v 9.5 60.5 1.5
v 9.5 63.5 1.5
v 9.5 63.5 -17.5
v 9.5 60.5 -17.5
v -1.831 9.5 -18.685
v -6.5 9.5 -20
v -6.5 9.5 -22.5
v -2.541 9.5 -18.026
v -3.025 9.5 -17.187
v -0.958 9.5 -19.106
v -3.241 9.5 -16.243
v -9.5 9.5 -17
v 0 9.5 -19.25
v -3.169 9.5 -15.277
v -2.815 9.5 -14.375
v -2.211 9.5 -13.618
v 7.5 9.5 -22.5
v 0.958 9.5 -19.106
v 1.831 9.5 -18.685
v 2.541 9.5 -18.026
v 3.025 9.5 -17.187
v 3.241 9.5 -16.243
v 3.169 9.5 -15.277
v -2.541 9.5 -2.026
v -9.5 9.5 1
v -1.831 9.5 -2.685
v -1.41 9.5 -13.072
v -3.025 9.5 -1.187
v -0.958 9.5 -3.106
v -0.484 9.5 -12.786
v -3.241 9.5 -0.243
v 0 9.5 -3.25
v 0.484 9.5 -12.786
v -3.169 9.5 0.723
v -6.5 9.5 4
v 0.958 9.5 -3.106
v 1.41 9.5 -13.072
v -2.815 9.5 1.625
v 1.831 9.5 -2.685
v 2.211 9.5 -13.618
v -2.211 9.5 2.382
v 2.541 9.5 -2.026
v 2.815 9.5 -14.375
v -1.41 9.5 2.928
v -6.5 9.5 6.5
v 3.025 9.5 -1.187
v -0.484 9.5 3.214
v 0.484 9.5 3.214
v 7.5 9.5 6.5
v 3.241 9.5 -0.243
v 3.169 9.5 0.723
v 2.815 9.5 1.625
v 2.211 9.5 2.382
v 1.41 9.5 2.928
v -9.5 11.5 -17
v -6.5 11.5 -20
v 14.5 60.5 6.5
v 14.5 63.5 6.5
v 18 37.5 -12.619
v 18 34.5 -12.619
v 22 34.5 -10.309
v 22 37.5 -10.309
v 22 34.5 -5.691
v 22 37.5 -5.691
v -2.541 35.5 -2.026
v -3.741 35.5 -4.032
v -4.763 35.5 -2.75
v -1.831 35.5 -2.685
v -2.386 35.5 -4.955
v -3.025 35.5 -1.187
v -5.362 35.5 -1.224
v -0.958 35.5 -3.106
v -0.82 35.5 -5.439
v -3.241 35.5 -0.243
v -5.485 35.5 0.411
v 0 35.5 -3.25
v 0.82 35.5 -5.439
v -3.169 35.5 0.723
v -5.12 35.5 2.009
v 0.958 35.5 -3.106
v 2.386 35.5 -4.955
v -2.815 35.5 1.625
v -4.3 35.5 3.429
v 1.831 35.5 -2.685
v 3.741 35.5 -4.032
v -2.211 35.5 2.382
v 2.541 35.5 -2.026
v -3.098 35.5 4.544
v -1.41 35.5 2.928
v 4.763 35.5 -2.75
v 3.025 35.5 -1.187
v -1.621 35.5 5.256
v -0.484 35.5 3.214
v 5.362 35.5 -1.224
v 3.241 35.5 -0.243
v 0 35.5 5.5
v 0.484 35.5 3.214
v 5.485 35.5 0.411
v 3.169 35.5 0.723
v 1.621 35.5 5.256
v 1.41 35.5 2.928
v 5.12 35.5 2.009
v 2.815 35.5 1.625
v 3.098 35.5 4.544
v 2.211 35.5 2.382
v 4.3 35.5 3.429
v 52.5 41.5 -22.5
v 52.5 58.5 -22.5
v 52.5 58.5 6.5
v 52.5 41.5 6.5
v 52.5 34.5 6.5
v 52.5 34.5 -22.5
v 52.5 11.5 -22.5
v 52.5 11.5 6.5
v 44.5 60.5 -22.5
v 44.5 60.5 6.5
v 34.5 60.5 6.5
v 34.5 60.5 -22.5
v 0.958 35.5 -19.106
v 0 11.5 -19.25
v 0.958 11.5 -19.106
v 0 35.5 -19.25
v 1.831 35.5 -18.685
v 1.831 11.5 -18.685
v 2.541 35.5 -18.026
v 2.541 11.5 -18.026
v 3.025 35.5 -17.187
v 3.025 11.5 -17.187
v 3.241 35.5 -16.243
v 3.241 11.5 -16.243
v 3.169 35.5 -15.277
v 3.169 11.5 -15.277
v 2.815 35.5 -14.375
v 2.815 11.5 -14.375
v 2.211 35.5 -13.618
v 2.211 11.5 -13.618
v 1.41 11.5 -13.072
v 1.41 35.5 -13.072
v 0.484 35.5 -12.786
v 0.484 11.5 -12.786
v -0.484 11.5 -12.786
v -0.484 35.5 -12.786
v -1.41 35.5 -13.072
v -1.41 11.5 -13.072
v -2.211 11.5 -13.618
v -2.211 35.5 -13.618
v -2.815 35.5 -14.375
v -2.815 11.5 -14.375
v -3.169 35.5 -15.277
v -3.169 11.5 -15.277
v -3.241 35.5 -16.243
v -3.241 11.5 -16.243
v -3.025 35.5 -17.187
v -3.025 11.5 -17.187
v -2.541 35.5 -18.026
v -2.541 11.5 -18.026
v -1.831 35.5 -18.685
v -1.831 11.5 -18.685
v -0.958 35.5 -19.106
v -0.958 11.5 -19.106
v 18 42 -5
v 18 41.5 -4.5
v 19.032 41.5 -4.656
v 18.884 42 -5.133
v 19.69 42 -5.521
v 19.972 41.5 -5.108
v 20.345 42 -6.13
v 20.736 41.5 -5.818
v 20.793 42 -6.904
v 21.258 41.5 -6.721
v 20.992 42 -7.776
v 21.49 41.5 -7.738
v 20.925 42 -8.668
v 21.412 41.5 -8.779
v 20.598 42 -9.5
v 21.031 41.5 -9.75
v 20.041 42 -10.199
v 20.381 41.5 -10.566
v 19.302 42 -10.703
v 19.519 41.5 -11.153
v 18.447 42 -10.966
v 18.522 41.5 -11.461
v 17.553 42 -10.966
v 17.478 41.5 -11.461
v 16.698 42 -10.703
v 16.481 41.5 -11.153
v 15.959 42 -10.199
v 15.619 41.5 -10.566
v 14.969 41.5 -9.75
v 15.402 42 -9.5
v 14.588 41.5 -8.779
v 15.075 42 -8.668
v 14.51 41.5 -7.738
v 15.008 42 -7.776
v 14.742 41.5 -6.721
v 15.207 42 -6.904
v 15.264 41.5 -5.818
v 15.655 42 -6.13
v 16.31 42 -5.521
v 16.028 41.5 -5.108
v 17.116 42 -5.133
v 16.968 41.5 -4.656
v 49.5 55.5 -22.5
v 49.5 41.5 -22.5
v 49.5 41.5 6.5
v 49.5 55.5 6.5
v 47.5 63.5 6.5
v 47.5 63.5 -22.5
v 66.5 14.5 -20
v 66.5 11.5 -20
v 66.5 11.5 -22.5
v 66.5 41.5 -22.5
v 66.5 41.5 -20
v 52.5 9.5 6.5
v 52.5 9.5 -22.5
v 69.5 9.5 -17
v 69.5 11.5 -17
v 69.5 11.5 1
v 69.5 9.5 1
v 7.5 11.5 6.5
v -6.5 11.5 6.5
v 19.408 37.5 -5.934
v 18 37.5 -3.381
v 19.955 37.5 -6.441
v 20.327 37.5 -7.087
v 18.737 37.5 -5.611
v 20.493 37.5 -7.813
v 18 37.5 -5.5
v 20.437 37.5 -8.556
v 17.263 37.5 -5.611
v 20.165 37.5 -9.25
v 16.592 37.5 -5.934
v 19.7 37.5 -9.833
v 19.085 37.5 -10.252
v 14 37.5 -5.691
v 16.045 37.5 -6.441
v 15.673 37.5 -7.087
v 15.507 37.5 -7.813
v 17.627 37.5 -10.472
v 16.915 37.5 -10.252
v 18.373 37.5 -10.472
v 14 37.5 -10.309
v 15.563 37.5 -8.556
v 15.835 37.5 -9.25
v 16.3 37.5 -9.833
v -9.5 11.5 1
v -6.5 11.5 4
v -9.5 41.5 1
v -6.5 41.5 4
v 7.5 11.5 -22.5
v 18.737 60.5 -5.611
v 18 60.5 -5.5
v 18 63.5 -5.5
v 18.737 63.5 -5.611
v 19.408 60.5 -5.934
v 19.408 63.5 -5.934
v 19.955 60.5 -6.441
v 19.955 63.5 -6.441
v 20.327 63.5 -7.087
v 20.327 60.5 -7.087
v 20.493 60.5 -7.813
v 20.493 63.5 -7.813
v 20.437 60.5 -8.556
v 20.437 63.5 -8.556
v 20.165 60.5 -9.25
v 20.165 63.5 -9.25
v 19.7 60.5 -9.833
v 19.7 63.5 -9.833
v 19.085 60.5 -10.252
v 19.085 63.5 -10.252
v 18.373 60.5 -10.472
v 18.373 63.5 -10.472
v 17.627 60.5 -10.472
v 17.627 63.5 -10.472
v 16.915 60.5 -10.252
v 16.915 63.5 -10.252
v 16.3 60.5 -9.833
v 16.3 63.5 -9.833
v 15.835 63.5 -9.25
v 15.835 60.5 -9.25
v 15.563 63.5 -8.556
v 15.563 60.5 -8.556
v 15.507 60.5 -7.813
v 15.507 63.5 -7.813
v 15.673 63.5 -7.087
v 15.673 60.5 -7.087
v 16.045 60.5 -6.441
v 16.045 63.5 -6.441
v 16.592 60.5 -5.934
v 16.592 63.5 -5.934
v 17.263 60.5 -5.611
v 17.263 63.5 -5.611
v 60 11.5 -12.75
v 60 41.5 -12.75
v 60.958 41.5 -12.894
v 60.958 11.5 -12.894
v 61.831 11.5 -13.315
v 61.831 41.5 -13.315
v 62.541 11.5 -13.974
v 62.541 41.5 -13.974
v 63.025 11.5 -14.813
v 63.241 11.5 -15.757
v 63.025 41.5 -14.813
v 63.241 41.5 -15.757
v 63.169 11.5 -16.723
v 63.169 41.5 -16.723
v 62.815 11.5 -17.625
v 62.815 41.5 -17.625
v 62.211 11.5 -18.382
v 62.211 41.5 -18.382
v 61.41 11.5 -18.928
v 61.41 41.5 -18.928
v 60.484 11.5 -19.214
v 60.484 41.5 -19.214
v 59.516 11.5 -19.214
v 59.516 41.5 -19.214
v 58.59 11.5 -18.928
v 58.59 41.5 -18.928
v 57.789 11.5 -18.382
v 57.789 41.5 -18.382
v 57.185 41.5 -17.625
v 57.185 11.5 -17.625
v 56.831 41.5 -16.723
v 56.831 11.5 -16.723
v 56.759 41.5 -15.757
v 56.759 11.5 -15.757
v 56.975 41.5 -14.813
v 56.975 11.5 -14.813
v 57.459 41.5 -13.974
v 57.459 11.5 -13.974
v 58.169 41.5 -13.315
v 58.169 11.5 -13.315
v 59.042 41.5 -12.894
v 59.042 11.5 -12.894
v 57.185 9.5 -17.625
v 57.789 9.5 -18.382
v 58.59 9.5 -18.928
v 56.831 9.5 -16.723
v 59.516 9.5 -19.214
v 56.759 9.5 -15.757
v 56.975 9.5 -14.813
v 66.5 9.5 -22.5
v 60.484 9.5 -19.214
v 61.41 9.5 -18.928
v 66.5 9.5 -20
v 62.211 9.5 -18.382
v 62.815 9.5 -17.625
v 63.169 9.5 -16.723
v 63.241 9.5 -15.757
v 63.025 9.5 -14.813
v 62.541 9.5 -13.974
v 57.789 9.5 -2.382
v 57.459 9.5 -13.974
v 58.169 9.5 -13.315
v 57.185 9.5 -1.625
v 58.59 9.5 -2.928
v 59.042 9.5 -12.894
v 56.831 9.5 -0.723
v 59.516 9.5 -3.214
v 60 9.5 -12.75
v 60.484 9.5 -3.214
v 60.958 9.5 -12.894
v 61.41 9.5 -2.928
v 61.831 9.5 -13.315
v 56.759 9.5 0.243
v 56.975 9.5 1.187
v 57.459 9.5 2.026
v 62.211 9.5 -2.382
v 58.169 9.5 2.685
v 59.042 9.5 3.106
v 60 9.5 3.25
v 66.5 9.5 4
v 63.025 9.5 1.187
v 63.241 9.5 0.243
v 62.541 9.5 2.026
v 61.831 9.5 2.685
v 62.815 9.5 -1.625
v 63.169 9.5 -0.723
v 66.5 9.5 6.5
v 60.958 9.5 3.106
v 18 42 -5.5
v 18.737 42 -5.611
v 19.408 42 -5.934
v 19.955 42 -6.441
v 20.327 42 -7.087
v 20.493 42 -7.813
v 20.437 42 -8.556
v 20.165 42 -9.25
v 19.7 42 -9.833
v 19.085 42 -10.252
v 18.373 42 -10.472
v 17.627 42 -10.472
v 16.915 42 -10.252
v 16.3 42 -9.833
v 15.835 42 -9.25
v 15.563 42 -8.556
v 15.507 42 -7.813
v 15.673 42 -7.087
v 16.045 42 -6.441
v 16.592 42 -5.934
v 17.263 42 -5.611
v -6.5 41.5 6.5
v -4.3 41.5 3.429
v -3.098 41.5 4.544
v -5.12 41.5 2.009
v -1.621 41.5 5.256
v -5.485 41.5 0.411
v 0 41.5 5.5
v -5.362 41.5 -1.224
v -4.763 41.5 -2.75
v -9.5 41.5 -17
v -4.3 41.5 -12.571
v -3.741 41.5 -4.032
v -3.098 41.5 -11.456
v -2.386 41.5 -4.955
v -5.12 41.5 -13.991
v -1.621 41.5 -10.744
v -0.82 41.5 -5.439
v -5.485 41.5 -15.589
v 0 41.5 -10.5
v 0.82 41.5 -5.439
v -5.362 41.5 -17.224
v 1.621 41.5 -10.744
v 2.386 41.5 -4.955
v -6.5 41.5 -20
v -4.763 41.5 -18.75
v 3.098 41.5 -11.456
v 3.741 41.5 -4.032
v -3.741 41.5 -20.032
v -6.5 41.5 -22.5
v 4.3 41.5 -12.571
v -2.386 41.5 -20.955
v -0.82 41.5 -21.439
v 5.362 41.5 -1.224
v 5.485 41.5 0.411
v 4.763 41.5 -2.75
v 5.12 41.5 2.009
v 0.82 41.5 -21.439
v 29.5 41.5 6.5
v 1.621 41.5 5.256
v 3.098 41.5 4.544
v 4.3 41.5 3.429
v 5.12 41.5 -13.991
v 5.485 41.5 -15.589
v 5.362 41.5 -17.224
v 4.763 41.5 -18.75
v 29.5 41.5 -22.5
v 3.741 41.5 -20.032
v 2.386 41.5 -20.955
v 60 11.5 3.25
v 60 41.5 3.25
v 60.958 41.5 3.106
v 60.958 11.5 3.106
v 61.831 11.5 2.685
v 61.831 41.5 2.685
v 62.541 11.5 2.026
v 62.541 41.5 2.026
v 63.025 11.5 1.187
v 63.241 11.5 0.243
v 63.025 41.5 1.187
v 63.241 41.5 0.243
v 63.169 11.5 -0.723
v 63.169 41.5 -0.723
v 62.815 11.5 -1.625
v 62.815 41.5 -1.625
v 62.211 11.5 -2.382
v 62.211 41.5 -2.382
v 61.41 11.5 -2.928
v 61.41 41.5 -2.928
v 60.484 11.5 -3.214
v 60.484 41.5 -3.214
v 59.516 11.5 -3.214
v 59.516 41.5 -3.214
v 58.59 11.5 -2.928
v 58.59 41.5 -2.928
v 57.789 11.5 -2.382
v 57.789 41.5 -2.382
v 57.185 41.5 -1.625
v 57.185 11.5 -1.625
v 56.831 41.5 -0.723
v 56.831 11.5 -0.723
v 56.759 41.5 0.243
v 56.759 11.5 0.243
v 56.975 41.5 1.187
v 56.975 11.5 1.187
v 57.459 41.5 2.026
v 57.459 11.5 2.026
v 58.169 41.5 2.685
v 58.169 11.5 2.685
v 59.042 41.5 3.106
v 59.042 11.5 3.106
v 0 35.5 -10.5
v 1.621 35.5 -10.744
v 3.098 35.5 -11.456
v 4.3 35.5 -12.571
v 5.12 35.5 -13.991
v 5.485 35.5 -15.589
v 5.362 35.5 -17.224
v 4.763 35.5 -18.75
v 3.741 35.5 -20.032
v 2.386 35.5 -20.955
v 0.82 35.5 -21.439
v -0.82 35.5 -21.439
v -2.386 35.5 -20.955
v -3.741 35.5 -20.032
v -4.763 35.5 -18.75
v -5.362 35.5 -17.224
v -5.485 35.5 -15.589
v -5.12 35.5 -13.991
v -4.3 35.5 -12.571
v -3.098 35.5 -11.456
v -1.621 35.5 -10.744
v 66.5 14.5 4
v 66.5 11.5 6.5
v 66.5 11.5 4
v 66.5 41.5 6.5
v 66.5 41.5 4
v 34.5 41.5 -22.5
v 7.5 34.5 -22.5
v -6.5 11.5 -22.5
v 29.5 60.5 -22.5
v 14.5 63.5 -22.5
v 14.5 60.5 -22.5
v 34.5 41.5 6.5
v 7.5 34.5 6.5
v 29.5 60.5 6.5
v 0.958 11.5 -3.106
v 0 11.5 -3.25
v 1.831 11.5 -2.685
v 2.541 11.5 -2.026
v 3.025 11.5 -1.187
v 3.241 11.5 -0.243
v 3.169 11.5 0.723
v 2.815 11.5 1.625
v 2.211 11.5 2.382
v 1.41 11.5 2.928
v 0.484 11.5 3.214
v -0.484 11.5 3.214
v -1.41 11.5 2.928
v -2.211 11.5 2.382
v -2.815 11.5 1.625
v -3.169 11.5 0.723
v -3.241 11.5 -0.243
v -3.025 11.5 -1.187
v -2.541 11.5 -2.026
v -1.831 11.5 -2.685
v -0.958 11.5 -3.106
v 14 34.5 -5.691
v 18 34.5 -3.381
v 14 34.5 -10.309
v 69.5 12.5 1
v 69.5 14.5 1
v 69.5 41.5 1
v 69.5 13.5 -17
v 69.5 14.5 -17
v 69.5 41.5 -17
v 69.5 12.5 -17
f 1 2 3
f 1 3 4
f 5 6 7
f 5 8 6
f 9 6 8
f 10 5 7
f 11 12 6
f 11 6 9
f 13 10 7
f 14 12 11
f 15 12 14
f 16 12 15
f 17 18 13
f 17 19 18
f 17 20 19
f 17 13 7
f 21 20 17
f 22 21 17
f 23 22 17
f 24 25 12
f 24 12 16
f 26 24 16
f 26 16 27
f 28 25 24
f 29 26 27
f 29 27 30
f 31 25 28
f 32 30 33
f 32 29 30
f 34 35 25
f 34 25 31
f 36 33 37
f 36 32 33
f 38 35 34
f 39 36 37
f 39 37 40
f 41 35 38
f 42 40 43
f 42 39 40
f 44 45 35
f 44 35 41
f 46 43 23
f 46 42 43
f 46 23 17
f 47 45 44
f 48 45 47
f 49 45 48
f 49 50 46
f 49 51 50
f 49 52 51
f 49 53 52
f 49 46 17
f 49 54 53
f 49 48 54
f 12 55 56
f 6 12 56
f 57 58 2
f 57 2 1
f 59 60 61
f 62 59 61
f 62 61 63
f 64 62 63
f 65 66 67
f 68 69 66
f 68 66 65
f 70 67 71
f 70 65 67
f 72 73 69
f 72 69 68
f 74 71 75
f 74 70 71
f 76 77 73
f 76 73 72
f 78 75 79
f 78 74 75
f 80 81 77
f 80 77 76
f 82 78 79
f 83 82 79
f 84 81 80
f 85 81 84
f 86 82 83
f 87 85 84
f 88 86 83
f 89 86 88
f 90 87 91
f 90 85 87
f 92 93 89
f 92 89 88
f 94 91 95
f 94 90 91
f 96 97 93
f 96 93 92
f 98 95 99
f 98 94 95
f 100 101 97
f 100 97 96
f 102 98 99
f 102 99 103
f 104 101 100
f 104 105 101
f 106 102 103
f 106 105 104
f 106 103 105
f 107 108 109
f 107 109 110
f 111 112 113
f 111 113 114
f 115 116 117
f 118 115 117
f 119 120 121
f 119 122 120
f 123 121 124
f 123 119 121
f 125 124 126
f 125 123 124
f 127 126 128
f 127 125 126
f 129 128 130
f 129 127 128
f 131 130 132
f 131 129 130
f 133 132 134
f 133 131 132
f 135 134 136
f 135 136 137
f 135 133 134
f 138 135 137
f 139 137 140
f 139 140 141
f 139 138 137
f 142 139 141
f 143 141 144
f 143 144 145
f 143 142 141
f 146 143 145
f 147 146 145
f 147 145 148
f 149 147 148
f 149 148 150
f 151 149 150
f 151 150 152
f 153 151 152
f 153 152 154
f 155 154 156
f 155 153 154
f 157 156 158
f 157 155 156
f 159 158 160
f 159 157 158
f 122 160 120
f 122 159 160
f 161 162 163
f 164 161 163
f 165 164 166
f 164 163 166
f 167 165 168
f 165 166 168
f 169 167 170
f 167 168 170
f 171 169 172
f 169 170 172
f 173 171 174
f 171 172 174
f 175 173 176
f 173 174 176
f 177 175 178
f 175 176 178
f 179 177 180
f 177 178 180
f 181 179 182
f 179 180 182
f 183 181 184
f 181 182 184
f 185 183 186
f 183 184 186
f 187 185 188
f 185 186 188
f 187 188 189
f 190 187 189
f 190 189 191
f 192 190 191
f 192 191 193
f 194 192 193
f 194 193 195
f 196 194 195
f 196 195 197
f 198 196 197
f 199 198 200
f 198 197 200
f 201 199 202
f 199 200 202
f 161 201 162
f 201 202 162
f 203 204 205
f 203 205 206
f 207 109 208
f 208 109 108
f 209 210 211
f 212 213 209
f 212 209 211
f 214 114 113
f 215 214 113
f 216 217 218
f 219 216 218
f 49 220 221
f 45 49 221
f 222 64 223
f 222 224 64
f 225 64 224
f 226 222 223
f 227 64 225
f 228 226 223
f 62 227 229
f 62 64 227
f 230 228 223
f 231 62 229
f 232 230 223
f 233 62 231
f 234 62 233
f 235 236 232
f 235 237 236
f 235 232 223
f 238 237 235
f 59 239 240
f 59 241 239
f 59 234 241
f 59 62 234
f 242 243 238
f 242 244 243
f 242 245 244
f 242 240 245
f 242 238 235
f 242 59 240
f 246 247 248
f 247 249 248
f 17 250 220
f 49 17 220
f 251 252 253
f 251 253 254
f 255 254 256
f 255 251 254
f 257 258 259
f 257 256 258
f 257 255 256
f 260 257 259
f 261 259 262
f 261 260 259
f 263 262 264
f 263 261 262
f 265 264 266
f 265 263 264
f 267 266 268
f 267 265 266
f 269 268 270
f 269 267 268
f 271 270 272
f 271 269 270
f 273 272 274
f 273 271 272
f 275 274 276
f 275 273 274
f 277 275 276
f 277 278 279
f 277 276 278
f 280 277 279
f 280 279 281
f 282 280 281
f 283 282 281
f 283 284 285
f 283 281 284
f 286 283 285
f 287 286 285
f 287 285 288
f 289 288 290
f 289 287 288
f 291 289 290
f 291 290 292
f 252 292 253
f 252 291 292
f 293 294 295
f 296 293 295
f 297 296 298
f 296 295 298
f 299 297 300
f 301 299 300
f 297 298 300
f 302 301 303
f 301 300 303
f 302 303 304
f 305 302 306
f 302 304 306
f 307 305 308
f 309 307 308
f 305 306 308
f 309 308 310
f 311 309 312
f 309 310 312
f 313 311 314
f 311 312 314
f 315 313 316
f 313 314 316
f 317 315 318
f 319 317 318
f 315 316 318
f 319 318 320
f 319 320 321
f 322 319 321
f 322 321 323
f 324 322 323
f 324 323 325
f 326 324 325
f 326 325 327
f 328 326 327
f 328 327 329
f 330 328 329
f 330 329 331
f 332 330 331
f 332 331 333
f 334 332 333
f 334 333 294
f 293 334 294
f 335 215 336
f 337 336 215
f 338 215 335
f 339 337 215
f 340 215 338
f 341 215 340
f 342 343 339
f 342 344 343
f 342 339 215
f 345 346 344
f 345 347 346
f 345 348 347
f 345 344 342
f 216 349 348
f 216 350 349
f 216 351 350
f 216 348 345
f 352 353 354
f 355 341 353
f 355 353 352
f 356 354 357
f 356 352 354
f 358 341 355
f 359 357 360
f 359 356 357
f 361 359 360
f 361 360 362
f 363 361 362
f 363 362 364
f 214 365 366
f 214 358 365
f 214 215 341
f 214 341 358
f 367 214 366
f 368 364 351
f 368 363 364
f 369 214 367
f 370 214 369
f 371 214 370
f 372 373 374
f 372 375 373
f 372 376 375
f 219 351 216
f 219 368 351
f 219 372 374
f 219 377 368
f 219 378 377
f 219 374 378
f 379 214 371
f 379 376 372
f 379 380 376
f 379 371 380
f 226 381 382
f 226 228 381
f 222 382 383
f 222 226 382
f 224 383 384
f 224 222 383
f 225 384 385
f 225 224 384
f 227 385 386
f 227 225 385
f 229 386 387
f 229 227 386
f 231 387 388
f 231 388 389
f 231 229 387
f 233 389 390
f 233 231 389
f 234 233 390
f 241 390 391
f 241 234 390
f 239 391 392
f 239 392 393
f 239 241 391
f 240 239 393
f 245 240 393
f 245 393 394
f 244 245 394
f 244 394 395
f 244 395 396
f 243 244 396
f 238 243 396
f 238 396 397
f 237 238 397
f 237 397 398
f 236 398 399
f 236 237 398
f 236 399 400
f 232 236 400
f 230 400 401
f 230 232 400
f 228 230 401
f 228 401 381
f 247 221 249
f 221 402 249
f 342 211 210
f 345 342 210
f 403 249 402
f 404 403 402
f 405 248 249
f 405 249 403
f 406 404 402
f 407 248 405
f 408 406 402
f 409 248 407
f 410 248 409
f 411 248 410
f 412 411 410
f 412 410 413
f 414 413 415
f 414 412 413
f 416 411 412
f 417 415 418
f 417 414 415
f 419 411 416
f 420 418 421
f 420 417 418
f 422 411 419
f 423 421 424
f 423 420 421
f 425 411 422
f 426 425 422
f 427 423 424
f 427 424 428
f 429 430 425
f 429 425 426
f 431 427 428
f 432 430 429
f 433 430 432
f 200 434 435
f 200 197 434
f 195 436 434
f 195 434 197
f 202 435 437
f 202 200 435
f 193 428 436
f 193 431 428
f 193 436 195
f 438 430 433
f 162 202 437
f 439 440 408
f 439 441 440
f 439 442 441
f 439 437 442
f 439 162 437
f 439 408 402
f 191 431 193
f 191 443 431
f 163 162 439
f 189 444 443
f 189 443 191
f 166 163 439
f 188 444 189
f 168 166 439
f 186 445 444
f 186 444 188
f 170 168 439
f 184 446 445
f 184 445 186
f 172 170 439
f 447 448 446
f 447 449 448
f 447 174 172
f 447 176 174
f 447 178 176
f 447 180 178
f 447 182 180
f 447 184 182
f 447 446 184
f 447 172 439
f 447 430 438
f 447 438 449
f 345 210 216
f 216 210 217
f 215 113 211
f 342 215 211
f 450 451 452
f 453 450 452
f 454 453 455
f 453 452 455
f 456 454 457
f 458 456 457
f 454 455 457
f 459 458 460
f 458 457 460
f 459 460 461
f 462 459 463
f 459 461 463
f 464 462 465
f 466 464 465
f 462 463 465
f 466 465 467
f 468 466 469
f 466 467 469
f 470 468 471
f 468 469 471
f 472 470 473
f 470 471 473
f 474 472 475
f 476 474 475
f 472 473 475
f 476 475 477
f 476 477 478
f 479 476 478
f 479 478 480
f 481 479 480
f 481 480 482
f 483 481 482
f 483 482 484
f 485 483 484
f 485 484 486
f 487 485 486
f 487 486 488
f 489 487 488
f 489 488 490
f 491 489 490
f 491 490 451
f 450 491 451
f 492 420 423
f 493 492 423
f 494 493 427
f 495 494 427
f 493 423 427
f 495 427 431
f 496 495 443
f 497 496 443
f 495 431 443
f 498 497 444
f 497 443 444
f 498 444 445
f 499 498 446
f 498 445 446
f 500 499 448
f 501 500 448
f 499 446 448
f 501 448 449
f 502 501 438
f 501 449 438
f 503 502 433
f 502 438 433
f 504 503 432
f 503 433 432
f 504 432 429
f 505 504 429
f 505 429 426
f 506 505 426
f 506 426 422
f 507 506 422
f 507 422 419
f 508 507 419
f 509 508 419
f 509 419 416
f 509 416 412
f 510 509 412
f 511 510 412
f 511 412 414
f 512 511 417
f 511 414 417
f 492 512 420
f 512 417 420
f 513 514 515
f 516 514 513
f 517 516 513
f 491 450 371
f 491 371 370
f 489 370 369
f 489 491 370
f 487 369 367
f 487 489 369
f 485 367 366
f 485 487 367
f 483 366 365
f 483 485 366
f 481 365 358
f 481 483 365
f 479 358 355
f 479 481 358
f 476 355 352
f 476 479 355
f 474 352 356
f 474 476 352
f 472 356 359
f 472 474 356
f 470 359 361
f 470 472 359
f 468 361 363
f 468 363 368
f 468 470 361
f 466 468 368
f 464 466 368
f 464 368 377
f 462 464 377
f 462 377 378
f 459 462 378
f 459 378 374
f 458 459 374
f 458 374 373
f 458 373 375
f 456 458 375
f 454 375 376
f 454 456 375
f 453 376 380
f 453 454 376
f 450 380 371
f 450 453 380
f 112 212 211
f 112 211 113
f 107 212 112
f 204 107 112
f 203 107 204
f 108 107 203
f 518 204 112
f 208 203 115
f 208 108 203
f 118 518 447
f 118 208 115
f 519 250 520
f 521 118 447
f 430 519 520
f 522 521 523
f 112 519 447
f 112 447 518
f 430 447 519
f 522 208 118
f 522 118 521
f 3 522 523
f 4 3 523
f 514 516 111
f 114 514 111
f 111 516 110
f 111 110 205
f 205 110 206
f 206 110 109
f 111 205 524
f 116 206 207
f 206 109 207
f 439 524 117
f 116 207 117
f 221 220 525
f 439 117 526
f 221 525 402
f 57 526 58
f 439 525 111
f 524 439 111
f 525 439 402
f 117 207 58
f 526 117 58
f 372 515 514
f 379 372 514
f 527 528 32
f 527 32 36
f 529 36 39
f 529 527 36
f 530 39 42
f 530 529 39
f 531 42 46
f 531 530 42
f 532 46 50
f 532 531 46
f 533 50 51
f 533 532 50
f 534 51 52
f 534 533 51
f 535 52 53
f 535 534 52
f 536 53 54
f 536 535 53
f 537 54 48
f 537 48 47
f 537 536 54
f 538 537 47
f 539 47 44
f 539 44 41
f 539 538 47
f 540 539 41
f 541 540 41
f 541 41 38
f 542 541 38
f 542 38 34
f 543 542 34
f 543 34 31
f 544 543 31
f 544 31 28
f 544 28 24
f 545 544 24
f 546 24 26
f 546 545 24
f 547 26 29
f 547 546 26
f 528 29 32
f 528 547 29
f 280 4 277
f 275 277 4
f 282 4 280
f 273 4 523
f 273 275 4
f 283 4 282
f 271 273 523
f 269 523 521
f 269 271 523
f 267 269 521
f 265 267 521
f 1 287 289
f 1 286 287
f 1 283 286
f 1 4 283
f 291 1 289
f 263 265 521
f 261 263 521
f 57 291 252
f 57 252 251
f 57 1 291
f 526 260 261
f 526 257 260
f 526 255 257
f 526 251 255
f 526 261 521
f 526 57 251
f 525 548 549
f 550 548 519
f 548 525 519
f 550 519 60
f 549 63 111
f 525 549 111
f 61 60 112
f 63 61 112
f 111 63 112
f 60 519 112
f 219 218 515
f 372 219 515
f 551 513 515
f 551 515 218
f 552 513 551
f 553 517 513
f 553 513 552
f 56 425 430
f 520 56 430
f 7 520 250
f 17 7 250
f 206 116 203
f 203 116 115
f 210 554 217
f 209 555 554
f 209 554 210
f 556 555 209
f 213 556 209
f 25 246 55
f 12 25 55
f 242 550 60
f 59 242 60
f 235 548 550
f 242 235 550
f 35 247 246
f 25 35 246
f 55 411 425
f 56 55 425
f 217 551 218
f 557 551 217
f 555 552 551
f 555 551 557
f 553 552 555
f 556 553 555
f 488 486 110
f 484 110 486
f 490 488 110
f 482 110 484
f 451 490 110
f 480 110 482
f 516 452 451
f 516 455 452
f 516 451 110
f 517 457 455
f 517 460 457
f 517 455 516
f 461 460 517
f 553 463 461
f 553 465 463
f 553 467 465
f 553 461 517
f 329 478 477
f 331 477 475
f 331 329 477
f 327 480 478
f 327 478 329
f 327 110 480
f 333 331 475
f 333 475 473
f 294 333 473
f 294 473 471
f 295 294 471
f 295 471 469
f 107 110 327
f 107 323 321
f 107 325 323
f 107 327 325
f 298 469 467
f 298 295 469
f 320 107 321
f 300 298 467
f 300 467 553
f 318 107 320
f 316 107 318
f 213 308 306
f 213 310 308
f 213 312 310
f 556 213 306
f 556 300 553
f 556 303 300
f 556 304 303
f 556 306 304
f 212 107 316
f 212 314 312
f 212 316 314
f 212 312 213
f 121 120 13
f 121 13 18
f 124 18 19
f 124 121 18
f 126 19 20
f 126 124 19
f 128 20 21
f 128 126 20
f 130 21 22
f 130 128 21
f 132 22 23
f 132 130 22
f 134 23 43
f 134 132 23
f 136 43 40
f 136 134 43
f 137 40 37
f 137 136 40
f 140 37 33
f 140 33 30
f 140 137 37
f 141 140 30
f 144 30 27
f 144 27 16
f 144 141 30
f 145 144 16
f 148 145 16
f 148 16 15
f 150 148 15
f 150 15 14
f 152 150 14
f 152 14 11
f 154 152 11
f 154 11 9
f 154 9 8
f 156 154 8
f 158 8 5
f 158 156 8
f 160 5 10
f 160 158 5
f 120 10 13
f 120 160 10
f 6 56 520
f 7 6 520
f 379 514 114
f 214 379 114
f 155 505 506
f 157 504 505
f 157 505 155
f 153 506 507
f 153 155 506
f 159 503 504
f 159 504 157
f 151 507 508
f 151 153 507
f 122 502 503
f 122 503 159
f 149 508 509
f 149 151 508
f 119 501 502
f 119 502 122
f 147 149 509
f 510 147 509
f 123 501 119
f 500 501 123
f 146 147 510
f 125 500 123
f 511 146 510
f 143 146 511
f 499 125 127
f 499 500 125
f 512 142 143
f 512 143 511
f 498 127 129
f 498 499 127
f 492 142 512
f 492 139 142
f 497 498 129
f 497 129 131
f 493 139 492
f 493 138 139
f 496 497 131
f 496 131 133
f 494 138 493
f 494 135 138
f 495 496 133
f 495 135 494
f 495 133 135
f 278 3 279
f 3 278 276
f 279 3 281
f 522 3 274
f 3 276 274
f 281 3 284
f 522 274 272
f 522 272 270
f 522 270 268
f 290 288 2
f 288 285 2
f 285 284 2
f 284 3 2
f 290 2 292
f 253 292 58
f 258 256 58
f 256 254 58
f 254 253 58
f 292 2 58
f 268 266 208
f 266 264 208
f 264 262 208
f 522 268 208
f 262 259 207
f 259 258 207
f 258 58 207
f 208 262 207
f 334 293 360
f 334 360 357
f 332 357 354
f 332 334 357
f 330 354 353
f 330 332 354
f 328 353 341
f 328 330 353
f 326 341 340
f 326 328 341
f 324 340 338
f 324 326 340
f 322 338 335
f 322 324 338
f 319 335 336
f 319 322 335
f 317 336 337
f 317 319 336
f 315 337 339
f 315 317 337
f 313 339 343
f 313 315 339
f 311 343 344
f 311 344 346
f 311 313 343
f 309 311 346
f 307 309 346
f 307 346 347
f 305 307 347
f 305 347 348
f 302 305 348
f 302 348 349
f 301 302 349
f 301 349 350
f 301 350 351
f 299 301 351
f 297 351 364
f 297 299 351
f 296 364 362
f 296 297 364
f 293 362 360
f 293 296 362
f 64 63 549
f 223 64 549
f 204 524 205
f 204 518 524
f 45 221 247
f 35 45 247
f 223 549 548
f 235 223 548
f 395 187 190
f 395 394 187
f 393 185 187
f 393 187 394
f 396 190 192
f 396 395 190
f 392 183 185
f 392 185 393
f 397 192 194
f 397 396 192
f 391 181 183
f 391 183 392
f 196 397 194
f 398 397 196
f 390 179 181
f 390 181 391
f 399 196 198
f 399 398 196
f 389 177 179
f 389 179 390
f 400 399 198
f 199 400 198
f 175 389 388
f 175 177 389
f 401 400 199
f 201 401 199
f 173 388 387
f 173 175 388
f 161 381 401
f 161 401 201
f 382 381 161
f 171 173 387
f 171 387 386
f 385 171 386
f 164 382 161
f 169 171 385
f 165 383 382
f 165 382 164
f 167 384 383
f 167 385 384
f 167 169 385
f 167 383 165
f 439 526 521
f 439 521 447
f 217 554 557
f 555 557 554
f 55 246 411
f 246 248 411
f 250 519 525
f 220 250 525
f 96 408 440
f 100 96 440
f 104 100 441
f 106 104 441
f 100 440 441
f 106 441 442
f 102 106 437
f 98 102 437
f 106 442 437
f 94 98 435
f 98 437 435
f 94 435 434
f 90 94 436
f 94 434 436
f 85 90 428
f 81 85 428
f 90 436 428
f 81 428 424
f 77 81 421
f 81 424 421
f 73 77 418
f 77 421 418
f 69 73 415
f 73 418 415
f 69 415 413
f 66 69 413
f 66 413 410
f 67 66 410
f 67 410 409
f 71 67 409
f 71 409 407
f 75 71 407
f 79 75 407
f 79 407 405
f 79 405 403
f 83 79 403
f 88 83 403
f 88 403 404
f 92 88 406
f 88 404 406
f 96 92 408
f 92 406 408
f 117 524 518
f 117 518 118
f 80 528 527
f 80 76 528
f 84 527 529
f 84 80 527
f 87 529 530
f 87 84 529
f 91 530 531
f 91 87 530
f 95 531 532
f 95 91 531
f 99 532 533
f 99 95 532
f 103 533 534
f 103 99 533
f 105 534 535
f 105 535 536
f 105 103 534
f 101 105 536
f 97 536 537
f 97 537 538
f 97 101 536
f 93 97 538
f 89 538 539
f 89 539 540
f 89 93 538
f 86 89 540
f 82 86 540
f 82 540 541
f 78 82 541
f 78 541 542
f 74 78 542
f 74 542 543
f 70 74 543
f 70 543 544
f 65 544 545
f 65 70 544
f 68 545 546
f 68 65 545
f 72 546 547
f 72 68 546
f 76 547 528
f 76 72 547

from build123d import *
from build123d.topology import SkipClean

# Parameters (mm, degrees)
SKETCH1_W               = 44.05184454
SKETCH1_H               = 18
BOSS_EXTRUDE1_DEPTH     = 1.5
SKETCH2_W               = 3
SKETCH2_H               = 18
BOSS_EXTRUDE2_DEPTH     = 13
SKETCH3_W               = 29
SKETCH3_H               = 3
BOSS_EXTRUDE3_DEPTH     = 14
CHAMFER1_SIZE           = 3
SKETCH4_R               = 3.25
CUT_EXTRUDE1_DEPTH      = 14
BOSS_EXTRUDE4_START     = 20
SKETCH5_R               = 3.25
BOSS_EXTRUDE4_DEPTH     = 20
BOSS_EXTRUDE5_START     = 7
SKETCH6_R               = 3.25
SKETCH6_W               = 22.5
SKETCH6_H               = 29
BOSS_EXTRUDE5_DEPTH     = 7
SKETCH8_R               = 3.25
BOSS_EXTRUDE6_DEPTH     = 23
BOSS_EXTRUDE8_DEPTH     = 29
SKETCH9_R               = 38.719812757
CUT_EXTRUDE2_DEPTH      = 11.5
CUT_EXTRUDE3_DEPTH      = 79.971513852
CUT_EXTRUDE3_DEPTH_BACK = 79.971513852
SKETCH10_R              = 2.5
CUT_EXTRUDE4_DEPTH      = 3
SKETCH12_R              = 3
SKETCH12_R_2            = 2.5
BOSS_EXTRUDE7_DEPTH     = 0.5
CHAMFER2_SIZE           = 0.5
SKETCH17_R              = 5.5
CUT_EXTRUDE5_DEPTH      = 6
CHAMFER3_SIZE           = 5
BOSS_EXTRUDE9_DEPTH     = 29
CHAMFER4_SIZE           = 5
SKETCH20_R              = 3.25
BOSS_EXTRUDE10_DEPTH    = 2


with BuildPart() as part:
    # Sketch1 → Boss-Extrude1 (new body)
    with BuildSketch(Plane(origin=(0, 0, 0), x_dir=(1, 0, 0), z_dir=(0, 1, 0))):
        with Locations((88.52592227, 8)):
            Rectangle(SKETCH1_W, SKETCH1_H)
        with BuildLine():
            Line((99.736944586, 5.75), (95.736944586, 5.75))
            ThreePointArc((95.736944586, 5.75), (93.486944586, 8), (95.736944586, 10.25))
            Line((95.736944586, 10.25), (99.736944586, 10.25))
            ThreePointArc((99.736944586, 10.25), (101.986944586, 8), (99.736944586, 5.75))
        make_face(mode=Mode.SUBTRACT)
    extrude(amount=BOSS_EXTRUDE1_DEPTH)

    # Sketch2 → Boss-Extrude2 (add)
    with BuildSketch(Plane(origin=(0, 1.5, 0), x_dir=(1, 0, 0), z_dir=(0, 1, 0))):
        with Locations((68, 8)):
            Rectangle(SKETCH2_W, SKETCH2_H)
    extrude(amount=BOSS_EXTRUDE2_DEPTH)

    # Sketch3 → Boss-Extrude3 (add)
    with BuildSketch(Plane.ZY.offset(-66.5)):
        with Locations((-8, 13)):
            Rectangle(SKETCH3_W, SKETCH3_H)
    extrude(amount=BOSS_EXTRUDE3_DEPTH)

    # Chamfer1
    chamfer1_edges = [part.edges().sort_by_distance(p)[0] for p in [
        (66.5, 13, 1),
        (66.5, 13, -17),
    ]]
    chamfer(chamfer1_edges, length=CHAMFER1_SIZE - 0.0001)  # a hair under: the kernel refuses the full size

    # Sketch4 → Cut-Extrude1 (cut)
    with BuildSketch(Plane(origin=(0, 14.5, 0), x_dir=(1, 0, 0), z_dir=(0, 1, 0))):
        with Locations(Location((60, 16, 0), (0, 0, 270))):
            Circle(SKETCH4_R)
        with Locations(Location((60, 0, 0), (0, 0, 270))):
            Circle(SKETCH4_R)
    extrude(amount=-CUT_EXTRUDE1_DEPTH, mode=Mode.SUBTRACT)

    # Sketch5 → Boss-Extrude4 (add)
    with SkipClean():  # the faces are left unmerged after this step: merging them gives an invalid solid
        with BuildSketch(Plane(origin=(0, 14.5, 0), x_dir=(1, 0, 0), z_dir=(0, 1, 0)).offset(BOSS_EXTRUDE4_START)):
            Polygon((69.5, -1), (69.5, 17), (66.5, 20), (66.5, 22.5), (52.5, 22.5), (52.5, -6.5), (66.5, -6.5), (66.5, -4), align=None)
            with Locations(Location((60, 16, 0), (0, 0, 270))):
                Circle(SKETCH5_R, mode=Mode.SUBTRACT)
            with Locations(Location((60, 0, 0), (0, 0, 270))):
                Circle(SKETCH5_R, mode=Mode.SUBTRACT)
        extrude(amount=-BOSS_EXTRUDE4_DEPTH)

    # Sketch6 → Boss-Extrude5 (add)
    # profile 1 of 3: a face of its own
    with BuildSketch(Plane(origin=(0, 34.5, 0), x_dir=(1, 0, 0), z_dir=(0, 1, 0)).offset(BOSS_EXTRUDE5_START)):
        Polygon((30, -6.5), (30, 22.5), (7.5, 22.5), (-6.5, 22.5), (-6.5, 20), (-9.5, 17), (-9.5, -1), (-6.5, -4), (-6.5, -6.5), (7.5, -6.5), align=None)
        with Locations(Location((0, 0, 0), (0, 0, 90))):
            Circle(SKETCH6_R, mode=Mode.SUBTRACT)
        with Locations(Location((0, 16, 0), (0, 0, 90))):
            Circle(SKETCH6_R, mode=Mode.SUBTRACT)
    # profile 2 of 3: a face of its own
    with BuildSketch(Plane(origin=(0, 34.5, 0), x_dir=(1, 0, 0), z_dir=(0, 1, 0)).offset(BOSS_EXTRUDE5_START)):
        with Locations((41.25, 8)):
            Rectangle(SKETCH6_W, SKETCH6_H)
    # profile 3 of 3: a face of its own
    with BuildSketch(Plane(origin=(0, 34.5, 0), x_dir=(1, 0, 0), z_dir=(0, 1, 0)).offset(BOSS_EXTRUDE5_START)):
        Polygon((66.5, -6.5), (66.5, -4), (69.5, -1), (69.5, 17), (66.5, 20), (66.5, 22.5), (52.5, 22.5), (52.5, -6.5), align=None)
        with Locations(Location((60, 0, 0), (0, 0, 270))):
            Circle(SKETCH6_R, mode=Mode.SUBTRACT)
        with Locations(Location((60, 16, 0), (0, 0, 270))):
            Circle(SKETCH6_R, mode=Mode.SUBTRACT)
    extrude(amount=-BOSS_EXTRUDE5_DEPTH)

    # Sketch8 → Boss-Extrude6 (add)
    with BuildSketch(Plane.XZ.offset(-34.5)):
        Polygon((7.5, -22.5), (7.5, 6.5), (-6.5, 6.5), (-6.5, 4), (-9.5, 1), (-9.5, -17), (-6.5, -20), (-6.5, -22.5), align=None)
        with Locations(Location((0, -16, 0), (0, 0, 270))):
            Circle(SKETCH8_R, mode=Mode.SUBTRACT)
        with Locations(Location((0, 0, 0), (0, 0, 270))):
            Circle(SKETCH8_R, mode=Mode.SUBTRACT)
    extrude(amount=BOSS_EXTRUDE6_DEPTH)

    # Sketch18 → Boss-Extrude8 (add)
    with BuildSketch(Plane.XY.offset(6.5)):
        Polygon((9.5, 60.5), (29.5, 60.5), (29.5, 41.5), (34.5, 41.5), (34.5, 63.5), (9.5, 63.5), align=None)
    extrude(amount=-BOSS_EXTRUDE8_DEPTH)

    # Sketch9 → Cut-Extrude2 (cut)
    with BuildSketch(Plane(origin=(0, 0, 0), x_dir=(-1, 0, 0), z_dir=(0, -1, 0))):
        with Locations((-87.720791246, 8.661967718)):
            Circle(SKETCH9_R)
    extrude(amount=-CUT_EXTRUDE2_DEPTH, mode=Mode.SUBTRACT)

    # Sketch10 → Cut-Extrude3 (cut, two sides: drawn at the far end of the back side and taken through both)
    with BuildSketch(Plane(origin=(0, 41.5, 0), x_dir=(1, 0, 0), z_dir=(0, 1, 0)).offset(-CUT_EXTRUDE3_DEPTH_BACK)):
        with Locations(Location((18, 8, 0), (0, 0, 270))):
            Circle(SKETCH10_R)
    extrude(amount=CUT_EXTRUDE3_DEPTH + CUT_EXTRUDE3_DEPTH_BACK, mode=Mode.SUBTRACT)

    # Sketch11 → Cut-Extrude4 (cut)
    with BuildSketch(Plane(origin=(0, 34.5, 0), x_dir=(-1, 0, 0), z_dir=(0, -1, 0))):
        Polygon((-18, 3.381197846), (-14, 5.690598923), (-14, 10.309401077), (-18, 12.618802154), (-22, 10.309401077), (-22, 5.690598923), align=None)
    extrude(amount=-CUT_EXTRUDE4_DEPTH, mode=Mode.SUBTRACT)

    # Sketch12 → Boss-Extrude7 (add)
    with BuildSketch(Plane(origin=(0, 41.5, 0), x_dir=(1, 0, 0), z_dir=(0, 1, 0))):
        with Locations(Location((18, 8, 0), (0, 0, 270))):
            Circle(SKETCH12_R)
        with Locations(Location((18, 8, 0), (0, 0, 270))):
            Circle(SKETCH12_R_2, mode=Mode.SUBTRACT)
    extrude(amount=BOSS_EXTRUDE7_DEPTH)

    # Chamfer2
    chamfer2_edges = [part.edges().sort_by_distance(p)[0] for p in [
        (18, 41.5, -11),
    ]]
    chamfer(chamfer2_edges, length=CHAMFER2_SIZE - 0.0001)  # a hair under: the kernel refuses the full size

    # Sketch17 → Cut-Extrude5 (cut)
    with BuildSketch(Plane(origin=(0, 41.5, 0), x_dir=(1, 0, 0), z_dir=(0, 1, 0))):
        with Locations(Location((0, 16, 0), (0, 0, 270))):
            Circle(SKETCH17_R)
        with Locations(Location((0, 0, 0), (0, 0, 270))):
            Circle(SKETCH17_R)
    extrude(amount=-CUT_EXTRUDE5_DEPTH, mode=Mode.SUBTRACT)

    # Chamfer3
    chamfer3_edges = [part.edges().sort_by_distance(p)[0] for p in [
        (9.5, 62, -22.5),
        (9.5, 62, 6.5),
    ]]
    chamfer(chamfer3_edges, length=CHAMFER3_SIZE)

    # Sketch19 → Boss-Extrude9 (add)
    with BuildSketch(Plane.XY.offset(6.5)):
        Polygon((34.5, 63.5), (52.5, 63.5), (52.5, 41.5), (49.5, 41.5), (49.5, 60.5), (29.5, 60.5), align=None)
    extrude(amount=-BOSS_EXTRUDE9_DEPTH)

    # Chamfer4
    chamfer4_edges = [part.edges().sort_by_distance(p)[0] for p in [
        (52.5, 63.5, -8),
        (49.5, 60.5, -8),
    ]]
    chamfer(chamfer4_edges, length=CHAMFER4_SIZE)

    # Sketch20 → Boss-Extrude10 (add)
    # profile 1 of 2: a face of its own
    with SkipClean():  # the faces are left unmerged after this step: merging them gives an invalid solid
        with BuildSketch(Plane.XZ.offset(-11.5)):
            Polygon((66.5, -20), (69.5, -17), (69.5, 1), (66.5, 4), (66.5, 6.5), (52.5, 6.5), (52.5, -22.5), (66.5, -22.5), align=None)
            with Locations(Location((60, 0, 0), (0, 0, 90))):
                Circle(SKETCH20_R, mode=Mode.SUBTRACT)
            with Locations(Location((60, -16, 0), (0, 0, 90))):
                Circle(SKETCH20_R, mode=Mode.SUBTRACT)
        # profile 2 of 2: a face of its own
        with BuildSketch(Plane.XZ.offset(-11.5)):
            Polygon((7.5, -22.5), (7.5, 6.5), (-6.5, 6.5), (-6.5, 4), (-9.5, 1), (-9.5, -17), (-6.5, -20), (-6.5, -22.5), align=None)
            with Locations(Location((0, 0, 0), (0, 0, 270))):
                Circle(SKETCH20_R, mode=Mode.SUBTRACT)
            with Locations(Location((0, -16, 0), (0, 0, 270))):
                Circle(SKETCH20_R, mode=Mode.SUBTRACT)
        extrude(amount=BOSS_EXTRUDE10_DEPTH)


solid = part.part
